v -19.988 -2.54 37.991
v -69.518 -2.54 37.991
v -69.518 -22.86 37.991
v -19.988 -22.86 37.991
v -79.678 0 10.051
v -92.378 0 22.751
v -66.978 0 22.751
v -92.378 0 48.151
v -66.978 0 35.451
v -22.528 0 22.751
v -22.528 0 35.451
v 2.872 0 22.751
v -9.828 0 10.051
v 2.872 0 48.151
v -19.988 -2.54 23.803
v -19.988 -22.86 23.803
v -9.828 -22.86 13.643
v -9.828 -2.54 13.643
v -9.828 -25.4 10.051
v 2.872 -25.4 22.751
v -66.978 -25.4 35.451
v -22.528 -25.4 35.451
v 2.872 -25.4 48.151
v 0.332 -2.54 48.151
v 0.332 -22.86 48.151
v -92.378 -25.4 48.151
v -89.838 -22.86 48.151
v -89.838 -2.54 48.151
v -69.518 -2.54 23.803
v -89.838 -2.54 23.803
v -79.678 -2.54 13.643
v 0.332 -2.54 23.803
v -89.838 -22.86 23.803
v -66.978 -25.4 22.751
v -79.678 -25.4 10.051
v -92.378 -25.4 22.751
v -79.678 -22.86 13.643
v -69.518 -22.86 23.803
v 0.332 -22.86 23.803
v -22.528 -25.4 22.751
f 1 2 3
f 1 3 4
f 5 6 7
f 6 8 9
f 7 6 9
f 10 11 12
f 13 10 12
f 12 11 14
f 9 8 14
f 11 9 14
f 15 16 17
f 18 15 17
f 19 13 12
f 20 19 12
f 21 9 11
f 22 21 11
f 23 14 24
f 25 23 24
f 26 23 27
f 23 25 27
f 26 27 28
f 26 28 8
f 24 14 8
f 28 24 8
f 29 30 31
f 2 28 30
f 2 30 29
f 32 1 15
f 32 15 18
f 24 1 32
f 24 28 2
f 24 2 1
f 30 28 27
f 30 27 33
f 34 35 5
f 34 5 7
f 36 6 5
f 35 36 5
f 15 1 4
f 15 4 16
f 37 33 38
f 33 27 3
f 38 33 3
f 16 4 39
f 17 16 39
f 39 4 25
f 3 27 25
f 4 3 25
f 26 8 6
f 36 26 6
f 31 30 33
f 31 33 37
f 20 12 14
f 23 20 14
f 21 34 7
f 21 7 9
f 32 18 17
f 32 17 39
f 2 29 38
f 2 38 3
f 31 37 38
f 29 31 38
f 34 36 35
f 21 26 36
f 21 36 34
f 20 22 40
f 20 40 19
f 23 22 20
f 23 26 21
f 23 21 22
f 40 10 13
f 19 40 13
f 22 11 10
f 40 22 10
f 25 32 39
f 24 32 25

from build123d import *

# Parameters (mm, degrees)
F1_DEPTH = 25.4
F2_T     = -2.54


with BuildPart() as f1:
    # F0 (on Front) → F1 (new body)
    with BuildSketch(Plane.XZ):
        Polygon((2.8720393181, 48.1509345859), (-44.7529606819, 48.1509345859), (-44.7529606819, 35.4509345859), (-22.5279606819, 35.4509345859), (-22.5279606819, 22.7509345859), (-9.8279606819, 10.0509345859), (2.8720393181, 22.7509345859), align=None)
        Polygon((-44.7529606819, 35.4509345859), (-44.7529606819, 48.1509345859), (-92.3779606819, 48.1509345859), (-92.3779606819, 22.7509345859), (-79.6779606819, 10.0509345859), (-66.9779606819, 22.7509345859), (-66.9779606819, 35.4509345859), align=None)
    extrude(amount=F1_DEPTH)

    # F2
    f2_openings = [f1.faces().sort_by_distance(p)[0] for p in [
        (-44.752961, -12.7, 48.150935),
    ]]
    offset(amount=F2_T, openings=f2_openings, kind=Kind.INTERSECTION)


solid = f1.part
